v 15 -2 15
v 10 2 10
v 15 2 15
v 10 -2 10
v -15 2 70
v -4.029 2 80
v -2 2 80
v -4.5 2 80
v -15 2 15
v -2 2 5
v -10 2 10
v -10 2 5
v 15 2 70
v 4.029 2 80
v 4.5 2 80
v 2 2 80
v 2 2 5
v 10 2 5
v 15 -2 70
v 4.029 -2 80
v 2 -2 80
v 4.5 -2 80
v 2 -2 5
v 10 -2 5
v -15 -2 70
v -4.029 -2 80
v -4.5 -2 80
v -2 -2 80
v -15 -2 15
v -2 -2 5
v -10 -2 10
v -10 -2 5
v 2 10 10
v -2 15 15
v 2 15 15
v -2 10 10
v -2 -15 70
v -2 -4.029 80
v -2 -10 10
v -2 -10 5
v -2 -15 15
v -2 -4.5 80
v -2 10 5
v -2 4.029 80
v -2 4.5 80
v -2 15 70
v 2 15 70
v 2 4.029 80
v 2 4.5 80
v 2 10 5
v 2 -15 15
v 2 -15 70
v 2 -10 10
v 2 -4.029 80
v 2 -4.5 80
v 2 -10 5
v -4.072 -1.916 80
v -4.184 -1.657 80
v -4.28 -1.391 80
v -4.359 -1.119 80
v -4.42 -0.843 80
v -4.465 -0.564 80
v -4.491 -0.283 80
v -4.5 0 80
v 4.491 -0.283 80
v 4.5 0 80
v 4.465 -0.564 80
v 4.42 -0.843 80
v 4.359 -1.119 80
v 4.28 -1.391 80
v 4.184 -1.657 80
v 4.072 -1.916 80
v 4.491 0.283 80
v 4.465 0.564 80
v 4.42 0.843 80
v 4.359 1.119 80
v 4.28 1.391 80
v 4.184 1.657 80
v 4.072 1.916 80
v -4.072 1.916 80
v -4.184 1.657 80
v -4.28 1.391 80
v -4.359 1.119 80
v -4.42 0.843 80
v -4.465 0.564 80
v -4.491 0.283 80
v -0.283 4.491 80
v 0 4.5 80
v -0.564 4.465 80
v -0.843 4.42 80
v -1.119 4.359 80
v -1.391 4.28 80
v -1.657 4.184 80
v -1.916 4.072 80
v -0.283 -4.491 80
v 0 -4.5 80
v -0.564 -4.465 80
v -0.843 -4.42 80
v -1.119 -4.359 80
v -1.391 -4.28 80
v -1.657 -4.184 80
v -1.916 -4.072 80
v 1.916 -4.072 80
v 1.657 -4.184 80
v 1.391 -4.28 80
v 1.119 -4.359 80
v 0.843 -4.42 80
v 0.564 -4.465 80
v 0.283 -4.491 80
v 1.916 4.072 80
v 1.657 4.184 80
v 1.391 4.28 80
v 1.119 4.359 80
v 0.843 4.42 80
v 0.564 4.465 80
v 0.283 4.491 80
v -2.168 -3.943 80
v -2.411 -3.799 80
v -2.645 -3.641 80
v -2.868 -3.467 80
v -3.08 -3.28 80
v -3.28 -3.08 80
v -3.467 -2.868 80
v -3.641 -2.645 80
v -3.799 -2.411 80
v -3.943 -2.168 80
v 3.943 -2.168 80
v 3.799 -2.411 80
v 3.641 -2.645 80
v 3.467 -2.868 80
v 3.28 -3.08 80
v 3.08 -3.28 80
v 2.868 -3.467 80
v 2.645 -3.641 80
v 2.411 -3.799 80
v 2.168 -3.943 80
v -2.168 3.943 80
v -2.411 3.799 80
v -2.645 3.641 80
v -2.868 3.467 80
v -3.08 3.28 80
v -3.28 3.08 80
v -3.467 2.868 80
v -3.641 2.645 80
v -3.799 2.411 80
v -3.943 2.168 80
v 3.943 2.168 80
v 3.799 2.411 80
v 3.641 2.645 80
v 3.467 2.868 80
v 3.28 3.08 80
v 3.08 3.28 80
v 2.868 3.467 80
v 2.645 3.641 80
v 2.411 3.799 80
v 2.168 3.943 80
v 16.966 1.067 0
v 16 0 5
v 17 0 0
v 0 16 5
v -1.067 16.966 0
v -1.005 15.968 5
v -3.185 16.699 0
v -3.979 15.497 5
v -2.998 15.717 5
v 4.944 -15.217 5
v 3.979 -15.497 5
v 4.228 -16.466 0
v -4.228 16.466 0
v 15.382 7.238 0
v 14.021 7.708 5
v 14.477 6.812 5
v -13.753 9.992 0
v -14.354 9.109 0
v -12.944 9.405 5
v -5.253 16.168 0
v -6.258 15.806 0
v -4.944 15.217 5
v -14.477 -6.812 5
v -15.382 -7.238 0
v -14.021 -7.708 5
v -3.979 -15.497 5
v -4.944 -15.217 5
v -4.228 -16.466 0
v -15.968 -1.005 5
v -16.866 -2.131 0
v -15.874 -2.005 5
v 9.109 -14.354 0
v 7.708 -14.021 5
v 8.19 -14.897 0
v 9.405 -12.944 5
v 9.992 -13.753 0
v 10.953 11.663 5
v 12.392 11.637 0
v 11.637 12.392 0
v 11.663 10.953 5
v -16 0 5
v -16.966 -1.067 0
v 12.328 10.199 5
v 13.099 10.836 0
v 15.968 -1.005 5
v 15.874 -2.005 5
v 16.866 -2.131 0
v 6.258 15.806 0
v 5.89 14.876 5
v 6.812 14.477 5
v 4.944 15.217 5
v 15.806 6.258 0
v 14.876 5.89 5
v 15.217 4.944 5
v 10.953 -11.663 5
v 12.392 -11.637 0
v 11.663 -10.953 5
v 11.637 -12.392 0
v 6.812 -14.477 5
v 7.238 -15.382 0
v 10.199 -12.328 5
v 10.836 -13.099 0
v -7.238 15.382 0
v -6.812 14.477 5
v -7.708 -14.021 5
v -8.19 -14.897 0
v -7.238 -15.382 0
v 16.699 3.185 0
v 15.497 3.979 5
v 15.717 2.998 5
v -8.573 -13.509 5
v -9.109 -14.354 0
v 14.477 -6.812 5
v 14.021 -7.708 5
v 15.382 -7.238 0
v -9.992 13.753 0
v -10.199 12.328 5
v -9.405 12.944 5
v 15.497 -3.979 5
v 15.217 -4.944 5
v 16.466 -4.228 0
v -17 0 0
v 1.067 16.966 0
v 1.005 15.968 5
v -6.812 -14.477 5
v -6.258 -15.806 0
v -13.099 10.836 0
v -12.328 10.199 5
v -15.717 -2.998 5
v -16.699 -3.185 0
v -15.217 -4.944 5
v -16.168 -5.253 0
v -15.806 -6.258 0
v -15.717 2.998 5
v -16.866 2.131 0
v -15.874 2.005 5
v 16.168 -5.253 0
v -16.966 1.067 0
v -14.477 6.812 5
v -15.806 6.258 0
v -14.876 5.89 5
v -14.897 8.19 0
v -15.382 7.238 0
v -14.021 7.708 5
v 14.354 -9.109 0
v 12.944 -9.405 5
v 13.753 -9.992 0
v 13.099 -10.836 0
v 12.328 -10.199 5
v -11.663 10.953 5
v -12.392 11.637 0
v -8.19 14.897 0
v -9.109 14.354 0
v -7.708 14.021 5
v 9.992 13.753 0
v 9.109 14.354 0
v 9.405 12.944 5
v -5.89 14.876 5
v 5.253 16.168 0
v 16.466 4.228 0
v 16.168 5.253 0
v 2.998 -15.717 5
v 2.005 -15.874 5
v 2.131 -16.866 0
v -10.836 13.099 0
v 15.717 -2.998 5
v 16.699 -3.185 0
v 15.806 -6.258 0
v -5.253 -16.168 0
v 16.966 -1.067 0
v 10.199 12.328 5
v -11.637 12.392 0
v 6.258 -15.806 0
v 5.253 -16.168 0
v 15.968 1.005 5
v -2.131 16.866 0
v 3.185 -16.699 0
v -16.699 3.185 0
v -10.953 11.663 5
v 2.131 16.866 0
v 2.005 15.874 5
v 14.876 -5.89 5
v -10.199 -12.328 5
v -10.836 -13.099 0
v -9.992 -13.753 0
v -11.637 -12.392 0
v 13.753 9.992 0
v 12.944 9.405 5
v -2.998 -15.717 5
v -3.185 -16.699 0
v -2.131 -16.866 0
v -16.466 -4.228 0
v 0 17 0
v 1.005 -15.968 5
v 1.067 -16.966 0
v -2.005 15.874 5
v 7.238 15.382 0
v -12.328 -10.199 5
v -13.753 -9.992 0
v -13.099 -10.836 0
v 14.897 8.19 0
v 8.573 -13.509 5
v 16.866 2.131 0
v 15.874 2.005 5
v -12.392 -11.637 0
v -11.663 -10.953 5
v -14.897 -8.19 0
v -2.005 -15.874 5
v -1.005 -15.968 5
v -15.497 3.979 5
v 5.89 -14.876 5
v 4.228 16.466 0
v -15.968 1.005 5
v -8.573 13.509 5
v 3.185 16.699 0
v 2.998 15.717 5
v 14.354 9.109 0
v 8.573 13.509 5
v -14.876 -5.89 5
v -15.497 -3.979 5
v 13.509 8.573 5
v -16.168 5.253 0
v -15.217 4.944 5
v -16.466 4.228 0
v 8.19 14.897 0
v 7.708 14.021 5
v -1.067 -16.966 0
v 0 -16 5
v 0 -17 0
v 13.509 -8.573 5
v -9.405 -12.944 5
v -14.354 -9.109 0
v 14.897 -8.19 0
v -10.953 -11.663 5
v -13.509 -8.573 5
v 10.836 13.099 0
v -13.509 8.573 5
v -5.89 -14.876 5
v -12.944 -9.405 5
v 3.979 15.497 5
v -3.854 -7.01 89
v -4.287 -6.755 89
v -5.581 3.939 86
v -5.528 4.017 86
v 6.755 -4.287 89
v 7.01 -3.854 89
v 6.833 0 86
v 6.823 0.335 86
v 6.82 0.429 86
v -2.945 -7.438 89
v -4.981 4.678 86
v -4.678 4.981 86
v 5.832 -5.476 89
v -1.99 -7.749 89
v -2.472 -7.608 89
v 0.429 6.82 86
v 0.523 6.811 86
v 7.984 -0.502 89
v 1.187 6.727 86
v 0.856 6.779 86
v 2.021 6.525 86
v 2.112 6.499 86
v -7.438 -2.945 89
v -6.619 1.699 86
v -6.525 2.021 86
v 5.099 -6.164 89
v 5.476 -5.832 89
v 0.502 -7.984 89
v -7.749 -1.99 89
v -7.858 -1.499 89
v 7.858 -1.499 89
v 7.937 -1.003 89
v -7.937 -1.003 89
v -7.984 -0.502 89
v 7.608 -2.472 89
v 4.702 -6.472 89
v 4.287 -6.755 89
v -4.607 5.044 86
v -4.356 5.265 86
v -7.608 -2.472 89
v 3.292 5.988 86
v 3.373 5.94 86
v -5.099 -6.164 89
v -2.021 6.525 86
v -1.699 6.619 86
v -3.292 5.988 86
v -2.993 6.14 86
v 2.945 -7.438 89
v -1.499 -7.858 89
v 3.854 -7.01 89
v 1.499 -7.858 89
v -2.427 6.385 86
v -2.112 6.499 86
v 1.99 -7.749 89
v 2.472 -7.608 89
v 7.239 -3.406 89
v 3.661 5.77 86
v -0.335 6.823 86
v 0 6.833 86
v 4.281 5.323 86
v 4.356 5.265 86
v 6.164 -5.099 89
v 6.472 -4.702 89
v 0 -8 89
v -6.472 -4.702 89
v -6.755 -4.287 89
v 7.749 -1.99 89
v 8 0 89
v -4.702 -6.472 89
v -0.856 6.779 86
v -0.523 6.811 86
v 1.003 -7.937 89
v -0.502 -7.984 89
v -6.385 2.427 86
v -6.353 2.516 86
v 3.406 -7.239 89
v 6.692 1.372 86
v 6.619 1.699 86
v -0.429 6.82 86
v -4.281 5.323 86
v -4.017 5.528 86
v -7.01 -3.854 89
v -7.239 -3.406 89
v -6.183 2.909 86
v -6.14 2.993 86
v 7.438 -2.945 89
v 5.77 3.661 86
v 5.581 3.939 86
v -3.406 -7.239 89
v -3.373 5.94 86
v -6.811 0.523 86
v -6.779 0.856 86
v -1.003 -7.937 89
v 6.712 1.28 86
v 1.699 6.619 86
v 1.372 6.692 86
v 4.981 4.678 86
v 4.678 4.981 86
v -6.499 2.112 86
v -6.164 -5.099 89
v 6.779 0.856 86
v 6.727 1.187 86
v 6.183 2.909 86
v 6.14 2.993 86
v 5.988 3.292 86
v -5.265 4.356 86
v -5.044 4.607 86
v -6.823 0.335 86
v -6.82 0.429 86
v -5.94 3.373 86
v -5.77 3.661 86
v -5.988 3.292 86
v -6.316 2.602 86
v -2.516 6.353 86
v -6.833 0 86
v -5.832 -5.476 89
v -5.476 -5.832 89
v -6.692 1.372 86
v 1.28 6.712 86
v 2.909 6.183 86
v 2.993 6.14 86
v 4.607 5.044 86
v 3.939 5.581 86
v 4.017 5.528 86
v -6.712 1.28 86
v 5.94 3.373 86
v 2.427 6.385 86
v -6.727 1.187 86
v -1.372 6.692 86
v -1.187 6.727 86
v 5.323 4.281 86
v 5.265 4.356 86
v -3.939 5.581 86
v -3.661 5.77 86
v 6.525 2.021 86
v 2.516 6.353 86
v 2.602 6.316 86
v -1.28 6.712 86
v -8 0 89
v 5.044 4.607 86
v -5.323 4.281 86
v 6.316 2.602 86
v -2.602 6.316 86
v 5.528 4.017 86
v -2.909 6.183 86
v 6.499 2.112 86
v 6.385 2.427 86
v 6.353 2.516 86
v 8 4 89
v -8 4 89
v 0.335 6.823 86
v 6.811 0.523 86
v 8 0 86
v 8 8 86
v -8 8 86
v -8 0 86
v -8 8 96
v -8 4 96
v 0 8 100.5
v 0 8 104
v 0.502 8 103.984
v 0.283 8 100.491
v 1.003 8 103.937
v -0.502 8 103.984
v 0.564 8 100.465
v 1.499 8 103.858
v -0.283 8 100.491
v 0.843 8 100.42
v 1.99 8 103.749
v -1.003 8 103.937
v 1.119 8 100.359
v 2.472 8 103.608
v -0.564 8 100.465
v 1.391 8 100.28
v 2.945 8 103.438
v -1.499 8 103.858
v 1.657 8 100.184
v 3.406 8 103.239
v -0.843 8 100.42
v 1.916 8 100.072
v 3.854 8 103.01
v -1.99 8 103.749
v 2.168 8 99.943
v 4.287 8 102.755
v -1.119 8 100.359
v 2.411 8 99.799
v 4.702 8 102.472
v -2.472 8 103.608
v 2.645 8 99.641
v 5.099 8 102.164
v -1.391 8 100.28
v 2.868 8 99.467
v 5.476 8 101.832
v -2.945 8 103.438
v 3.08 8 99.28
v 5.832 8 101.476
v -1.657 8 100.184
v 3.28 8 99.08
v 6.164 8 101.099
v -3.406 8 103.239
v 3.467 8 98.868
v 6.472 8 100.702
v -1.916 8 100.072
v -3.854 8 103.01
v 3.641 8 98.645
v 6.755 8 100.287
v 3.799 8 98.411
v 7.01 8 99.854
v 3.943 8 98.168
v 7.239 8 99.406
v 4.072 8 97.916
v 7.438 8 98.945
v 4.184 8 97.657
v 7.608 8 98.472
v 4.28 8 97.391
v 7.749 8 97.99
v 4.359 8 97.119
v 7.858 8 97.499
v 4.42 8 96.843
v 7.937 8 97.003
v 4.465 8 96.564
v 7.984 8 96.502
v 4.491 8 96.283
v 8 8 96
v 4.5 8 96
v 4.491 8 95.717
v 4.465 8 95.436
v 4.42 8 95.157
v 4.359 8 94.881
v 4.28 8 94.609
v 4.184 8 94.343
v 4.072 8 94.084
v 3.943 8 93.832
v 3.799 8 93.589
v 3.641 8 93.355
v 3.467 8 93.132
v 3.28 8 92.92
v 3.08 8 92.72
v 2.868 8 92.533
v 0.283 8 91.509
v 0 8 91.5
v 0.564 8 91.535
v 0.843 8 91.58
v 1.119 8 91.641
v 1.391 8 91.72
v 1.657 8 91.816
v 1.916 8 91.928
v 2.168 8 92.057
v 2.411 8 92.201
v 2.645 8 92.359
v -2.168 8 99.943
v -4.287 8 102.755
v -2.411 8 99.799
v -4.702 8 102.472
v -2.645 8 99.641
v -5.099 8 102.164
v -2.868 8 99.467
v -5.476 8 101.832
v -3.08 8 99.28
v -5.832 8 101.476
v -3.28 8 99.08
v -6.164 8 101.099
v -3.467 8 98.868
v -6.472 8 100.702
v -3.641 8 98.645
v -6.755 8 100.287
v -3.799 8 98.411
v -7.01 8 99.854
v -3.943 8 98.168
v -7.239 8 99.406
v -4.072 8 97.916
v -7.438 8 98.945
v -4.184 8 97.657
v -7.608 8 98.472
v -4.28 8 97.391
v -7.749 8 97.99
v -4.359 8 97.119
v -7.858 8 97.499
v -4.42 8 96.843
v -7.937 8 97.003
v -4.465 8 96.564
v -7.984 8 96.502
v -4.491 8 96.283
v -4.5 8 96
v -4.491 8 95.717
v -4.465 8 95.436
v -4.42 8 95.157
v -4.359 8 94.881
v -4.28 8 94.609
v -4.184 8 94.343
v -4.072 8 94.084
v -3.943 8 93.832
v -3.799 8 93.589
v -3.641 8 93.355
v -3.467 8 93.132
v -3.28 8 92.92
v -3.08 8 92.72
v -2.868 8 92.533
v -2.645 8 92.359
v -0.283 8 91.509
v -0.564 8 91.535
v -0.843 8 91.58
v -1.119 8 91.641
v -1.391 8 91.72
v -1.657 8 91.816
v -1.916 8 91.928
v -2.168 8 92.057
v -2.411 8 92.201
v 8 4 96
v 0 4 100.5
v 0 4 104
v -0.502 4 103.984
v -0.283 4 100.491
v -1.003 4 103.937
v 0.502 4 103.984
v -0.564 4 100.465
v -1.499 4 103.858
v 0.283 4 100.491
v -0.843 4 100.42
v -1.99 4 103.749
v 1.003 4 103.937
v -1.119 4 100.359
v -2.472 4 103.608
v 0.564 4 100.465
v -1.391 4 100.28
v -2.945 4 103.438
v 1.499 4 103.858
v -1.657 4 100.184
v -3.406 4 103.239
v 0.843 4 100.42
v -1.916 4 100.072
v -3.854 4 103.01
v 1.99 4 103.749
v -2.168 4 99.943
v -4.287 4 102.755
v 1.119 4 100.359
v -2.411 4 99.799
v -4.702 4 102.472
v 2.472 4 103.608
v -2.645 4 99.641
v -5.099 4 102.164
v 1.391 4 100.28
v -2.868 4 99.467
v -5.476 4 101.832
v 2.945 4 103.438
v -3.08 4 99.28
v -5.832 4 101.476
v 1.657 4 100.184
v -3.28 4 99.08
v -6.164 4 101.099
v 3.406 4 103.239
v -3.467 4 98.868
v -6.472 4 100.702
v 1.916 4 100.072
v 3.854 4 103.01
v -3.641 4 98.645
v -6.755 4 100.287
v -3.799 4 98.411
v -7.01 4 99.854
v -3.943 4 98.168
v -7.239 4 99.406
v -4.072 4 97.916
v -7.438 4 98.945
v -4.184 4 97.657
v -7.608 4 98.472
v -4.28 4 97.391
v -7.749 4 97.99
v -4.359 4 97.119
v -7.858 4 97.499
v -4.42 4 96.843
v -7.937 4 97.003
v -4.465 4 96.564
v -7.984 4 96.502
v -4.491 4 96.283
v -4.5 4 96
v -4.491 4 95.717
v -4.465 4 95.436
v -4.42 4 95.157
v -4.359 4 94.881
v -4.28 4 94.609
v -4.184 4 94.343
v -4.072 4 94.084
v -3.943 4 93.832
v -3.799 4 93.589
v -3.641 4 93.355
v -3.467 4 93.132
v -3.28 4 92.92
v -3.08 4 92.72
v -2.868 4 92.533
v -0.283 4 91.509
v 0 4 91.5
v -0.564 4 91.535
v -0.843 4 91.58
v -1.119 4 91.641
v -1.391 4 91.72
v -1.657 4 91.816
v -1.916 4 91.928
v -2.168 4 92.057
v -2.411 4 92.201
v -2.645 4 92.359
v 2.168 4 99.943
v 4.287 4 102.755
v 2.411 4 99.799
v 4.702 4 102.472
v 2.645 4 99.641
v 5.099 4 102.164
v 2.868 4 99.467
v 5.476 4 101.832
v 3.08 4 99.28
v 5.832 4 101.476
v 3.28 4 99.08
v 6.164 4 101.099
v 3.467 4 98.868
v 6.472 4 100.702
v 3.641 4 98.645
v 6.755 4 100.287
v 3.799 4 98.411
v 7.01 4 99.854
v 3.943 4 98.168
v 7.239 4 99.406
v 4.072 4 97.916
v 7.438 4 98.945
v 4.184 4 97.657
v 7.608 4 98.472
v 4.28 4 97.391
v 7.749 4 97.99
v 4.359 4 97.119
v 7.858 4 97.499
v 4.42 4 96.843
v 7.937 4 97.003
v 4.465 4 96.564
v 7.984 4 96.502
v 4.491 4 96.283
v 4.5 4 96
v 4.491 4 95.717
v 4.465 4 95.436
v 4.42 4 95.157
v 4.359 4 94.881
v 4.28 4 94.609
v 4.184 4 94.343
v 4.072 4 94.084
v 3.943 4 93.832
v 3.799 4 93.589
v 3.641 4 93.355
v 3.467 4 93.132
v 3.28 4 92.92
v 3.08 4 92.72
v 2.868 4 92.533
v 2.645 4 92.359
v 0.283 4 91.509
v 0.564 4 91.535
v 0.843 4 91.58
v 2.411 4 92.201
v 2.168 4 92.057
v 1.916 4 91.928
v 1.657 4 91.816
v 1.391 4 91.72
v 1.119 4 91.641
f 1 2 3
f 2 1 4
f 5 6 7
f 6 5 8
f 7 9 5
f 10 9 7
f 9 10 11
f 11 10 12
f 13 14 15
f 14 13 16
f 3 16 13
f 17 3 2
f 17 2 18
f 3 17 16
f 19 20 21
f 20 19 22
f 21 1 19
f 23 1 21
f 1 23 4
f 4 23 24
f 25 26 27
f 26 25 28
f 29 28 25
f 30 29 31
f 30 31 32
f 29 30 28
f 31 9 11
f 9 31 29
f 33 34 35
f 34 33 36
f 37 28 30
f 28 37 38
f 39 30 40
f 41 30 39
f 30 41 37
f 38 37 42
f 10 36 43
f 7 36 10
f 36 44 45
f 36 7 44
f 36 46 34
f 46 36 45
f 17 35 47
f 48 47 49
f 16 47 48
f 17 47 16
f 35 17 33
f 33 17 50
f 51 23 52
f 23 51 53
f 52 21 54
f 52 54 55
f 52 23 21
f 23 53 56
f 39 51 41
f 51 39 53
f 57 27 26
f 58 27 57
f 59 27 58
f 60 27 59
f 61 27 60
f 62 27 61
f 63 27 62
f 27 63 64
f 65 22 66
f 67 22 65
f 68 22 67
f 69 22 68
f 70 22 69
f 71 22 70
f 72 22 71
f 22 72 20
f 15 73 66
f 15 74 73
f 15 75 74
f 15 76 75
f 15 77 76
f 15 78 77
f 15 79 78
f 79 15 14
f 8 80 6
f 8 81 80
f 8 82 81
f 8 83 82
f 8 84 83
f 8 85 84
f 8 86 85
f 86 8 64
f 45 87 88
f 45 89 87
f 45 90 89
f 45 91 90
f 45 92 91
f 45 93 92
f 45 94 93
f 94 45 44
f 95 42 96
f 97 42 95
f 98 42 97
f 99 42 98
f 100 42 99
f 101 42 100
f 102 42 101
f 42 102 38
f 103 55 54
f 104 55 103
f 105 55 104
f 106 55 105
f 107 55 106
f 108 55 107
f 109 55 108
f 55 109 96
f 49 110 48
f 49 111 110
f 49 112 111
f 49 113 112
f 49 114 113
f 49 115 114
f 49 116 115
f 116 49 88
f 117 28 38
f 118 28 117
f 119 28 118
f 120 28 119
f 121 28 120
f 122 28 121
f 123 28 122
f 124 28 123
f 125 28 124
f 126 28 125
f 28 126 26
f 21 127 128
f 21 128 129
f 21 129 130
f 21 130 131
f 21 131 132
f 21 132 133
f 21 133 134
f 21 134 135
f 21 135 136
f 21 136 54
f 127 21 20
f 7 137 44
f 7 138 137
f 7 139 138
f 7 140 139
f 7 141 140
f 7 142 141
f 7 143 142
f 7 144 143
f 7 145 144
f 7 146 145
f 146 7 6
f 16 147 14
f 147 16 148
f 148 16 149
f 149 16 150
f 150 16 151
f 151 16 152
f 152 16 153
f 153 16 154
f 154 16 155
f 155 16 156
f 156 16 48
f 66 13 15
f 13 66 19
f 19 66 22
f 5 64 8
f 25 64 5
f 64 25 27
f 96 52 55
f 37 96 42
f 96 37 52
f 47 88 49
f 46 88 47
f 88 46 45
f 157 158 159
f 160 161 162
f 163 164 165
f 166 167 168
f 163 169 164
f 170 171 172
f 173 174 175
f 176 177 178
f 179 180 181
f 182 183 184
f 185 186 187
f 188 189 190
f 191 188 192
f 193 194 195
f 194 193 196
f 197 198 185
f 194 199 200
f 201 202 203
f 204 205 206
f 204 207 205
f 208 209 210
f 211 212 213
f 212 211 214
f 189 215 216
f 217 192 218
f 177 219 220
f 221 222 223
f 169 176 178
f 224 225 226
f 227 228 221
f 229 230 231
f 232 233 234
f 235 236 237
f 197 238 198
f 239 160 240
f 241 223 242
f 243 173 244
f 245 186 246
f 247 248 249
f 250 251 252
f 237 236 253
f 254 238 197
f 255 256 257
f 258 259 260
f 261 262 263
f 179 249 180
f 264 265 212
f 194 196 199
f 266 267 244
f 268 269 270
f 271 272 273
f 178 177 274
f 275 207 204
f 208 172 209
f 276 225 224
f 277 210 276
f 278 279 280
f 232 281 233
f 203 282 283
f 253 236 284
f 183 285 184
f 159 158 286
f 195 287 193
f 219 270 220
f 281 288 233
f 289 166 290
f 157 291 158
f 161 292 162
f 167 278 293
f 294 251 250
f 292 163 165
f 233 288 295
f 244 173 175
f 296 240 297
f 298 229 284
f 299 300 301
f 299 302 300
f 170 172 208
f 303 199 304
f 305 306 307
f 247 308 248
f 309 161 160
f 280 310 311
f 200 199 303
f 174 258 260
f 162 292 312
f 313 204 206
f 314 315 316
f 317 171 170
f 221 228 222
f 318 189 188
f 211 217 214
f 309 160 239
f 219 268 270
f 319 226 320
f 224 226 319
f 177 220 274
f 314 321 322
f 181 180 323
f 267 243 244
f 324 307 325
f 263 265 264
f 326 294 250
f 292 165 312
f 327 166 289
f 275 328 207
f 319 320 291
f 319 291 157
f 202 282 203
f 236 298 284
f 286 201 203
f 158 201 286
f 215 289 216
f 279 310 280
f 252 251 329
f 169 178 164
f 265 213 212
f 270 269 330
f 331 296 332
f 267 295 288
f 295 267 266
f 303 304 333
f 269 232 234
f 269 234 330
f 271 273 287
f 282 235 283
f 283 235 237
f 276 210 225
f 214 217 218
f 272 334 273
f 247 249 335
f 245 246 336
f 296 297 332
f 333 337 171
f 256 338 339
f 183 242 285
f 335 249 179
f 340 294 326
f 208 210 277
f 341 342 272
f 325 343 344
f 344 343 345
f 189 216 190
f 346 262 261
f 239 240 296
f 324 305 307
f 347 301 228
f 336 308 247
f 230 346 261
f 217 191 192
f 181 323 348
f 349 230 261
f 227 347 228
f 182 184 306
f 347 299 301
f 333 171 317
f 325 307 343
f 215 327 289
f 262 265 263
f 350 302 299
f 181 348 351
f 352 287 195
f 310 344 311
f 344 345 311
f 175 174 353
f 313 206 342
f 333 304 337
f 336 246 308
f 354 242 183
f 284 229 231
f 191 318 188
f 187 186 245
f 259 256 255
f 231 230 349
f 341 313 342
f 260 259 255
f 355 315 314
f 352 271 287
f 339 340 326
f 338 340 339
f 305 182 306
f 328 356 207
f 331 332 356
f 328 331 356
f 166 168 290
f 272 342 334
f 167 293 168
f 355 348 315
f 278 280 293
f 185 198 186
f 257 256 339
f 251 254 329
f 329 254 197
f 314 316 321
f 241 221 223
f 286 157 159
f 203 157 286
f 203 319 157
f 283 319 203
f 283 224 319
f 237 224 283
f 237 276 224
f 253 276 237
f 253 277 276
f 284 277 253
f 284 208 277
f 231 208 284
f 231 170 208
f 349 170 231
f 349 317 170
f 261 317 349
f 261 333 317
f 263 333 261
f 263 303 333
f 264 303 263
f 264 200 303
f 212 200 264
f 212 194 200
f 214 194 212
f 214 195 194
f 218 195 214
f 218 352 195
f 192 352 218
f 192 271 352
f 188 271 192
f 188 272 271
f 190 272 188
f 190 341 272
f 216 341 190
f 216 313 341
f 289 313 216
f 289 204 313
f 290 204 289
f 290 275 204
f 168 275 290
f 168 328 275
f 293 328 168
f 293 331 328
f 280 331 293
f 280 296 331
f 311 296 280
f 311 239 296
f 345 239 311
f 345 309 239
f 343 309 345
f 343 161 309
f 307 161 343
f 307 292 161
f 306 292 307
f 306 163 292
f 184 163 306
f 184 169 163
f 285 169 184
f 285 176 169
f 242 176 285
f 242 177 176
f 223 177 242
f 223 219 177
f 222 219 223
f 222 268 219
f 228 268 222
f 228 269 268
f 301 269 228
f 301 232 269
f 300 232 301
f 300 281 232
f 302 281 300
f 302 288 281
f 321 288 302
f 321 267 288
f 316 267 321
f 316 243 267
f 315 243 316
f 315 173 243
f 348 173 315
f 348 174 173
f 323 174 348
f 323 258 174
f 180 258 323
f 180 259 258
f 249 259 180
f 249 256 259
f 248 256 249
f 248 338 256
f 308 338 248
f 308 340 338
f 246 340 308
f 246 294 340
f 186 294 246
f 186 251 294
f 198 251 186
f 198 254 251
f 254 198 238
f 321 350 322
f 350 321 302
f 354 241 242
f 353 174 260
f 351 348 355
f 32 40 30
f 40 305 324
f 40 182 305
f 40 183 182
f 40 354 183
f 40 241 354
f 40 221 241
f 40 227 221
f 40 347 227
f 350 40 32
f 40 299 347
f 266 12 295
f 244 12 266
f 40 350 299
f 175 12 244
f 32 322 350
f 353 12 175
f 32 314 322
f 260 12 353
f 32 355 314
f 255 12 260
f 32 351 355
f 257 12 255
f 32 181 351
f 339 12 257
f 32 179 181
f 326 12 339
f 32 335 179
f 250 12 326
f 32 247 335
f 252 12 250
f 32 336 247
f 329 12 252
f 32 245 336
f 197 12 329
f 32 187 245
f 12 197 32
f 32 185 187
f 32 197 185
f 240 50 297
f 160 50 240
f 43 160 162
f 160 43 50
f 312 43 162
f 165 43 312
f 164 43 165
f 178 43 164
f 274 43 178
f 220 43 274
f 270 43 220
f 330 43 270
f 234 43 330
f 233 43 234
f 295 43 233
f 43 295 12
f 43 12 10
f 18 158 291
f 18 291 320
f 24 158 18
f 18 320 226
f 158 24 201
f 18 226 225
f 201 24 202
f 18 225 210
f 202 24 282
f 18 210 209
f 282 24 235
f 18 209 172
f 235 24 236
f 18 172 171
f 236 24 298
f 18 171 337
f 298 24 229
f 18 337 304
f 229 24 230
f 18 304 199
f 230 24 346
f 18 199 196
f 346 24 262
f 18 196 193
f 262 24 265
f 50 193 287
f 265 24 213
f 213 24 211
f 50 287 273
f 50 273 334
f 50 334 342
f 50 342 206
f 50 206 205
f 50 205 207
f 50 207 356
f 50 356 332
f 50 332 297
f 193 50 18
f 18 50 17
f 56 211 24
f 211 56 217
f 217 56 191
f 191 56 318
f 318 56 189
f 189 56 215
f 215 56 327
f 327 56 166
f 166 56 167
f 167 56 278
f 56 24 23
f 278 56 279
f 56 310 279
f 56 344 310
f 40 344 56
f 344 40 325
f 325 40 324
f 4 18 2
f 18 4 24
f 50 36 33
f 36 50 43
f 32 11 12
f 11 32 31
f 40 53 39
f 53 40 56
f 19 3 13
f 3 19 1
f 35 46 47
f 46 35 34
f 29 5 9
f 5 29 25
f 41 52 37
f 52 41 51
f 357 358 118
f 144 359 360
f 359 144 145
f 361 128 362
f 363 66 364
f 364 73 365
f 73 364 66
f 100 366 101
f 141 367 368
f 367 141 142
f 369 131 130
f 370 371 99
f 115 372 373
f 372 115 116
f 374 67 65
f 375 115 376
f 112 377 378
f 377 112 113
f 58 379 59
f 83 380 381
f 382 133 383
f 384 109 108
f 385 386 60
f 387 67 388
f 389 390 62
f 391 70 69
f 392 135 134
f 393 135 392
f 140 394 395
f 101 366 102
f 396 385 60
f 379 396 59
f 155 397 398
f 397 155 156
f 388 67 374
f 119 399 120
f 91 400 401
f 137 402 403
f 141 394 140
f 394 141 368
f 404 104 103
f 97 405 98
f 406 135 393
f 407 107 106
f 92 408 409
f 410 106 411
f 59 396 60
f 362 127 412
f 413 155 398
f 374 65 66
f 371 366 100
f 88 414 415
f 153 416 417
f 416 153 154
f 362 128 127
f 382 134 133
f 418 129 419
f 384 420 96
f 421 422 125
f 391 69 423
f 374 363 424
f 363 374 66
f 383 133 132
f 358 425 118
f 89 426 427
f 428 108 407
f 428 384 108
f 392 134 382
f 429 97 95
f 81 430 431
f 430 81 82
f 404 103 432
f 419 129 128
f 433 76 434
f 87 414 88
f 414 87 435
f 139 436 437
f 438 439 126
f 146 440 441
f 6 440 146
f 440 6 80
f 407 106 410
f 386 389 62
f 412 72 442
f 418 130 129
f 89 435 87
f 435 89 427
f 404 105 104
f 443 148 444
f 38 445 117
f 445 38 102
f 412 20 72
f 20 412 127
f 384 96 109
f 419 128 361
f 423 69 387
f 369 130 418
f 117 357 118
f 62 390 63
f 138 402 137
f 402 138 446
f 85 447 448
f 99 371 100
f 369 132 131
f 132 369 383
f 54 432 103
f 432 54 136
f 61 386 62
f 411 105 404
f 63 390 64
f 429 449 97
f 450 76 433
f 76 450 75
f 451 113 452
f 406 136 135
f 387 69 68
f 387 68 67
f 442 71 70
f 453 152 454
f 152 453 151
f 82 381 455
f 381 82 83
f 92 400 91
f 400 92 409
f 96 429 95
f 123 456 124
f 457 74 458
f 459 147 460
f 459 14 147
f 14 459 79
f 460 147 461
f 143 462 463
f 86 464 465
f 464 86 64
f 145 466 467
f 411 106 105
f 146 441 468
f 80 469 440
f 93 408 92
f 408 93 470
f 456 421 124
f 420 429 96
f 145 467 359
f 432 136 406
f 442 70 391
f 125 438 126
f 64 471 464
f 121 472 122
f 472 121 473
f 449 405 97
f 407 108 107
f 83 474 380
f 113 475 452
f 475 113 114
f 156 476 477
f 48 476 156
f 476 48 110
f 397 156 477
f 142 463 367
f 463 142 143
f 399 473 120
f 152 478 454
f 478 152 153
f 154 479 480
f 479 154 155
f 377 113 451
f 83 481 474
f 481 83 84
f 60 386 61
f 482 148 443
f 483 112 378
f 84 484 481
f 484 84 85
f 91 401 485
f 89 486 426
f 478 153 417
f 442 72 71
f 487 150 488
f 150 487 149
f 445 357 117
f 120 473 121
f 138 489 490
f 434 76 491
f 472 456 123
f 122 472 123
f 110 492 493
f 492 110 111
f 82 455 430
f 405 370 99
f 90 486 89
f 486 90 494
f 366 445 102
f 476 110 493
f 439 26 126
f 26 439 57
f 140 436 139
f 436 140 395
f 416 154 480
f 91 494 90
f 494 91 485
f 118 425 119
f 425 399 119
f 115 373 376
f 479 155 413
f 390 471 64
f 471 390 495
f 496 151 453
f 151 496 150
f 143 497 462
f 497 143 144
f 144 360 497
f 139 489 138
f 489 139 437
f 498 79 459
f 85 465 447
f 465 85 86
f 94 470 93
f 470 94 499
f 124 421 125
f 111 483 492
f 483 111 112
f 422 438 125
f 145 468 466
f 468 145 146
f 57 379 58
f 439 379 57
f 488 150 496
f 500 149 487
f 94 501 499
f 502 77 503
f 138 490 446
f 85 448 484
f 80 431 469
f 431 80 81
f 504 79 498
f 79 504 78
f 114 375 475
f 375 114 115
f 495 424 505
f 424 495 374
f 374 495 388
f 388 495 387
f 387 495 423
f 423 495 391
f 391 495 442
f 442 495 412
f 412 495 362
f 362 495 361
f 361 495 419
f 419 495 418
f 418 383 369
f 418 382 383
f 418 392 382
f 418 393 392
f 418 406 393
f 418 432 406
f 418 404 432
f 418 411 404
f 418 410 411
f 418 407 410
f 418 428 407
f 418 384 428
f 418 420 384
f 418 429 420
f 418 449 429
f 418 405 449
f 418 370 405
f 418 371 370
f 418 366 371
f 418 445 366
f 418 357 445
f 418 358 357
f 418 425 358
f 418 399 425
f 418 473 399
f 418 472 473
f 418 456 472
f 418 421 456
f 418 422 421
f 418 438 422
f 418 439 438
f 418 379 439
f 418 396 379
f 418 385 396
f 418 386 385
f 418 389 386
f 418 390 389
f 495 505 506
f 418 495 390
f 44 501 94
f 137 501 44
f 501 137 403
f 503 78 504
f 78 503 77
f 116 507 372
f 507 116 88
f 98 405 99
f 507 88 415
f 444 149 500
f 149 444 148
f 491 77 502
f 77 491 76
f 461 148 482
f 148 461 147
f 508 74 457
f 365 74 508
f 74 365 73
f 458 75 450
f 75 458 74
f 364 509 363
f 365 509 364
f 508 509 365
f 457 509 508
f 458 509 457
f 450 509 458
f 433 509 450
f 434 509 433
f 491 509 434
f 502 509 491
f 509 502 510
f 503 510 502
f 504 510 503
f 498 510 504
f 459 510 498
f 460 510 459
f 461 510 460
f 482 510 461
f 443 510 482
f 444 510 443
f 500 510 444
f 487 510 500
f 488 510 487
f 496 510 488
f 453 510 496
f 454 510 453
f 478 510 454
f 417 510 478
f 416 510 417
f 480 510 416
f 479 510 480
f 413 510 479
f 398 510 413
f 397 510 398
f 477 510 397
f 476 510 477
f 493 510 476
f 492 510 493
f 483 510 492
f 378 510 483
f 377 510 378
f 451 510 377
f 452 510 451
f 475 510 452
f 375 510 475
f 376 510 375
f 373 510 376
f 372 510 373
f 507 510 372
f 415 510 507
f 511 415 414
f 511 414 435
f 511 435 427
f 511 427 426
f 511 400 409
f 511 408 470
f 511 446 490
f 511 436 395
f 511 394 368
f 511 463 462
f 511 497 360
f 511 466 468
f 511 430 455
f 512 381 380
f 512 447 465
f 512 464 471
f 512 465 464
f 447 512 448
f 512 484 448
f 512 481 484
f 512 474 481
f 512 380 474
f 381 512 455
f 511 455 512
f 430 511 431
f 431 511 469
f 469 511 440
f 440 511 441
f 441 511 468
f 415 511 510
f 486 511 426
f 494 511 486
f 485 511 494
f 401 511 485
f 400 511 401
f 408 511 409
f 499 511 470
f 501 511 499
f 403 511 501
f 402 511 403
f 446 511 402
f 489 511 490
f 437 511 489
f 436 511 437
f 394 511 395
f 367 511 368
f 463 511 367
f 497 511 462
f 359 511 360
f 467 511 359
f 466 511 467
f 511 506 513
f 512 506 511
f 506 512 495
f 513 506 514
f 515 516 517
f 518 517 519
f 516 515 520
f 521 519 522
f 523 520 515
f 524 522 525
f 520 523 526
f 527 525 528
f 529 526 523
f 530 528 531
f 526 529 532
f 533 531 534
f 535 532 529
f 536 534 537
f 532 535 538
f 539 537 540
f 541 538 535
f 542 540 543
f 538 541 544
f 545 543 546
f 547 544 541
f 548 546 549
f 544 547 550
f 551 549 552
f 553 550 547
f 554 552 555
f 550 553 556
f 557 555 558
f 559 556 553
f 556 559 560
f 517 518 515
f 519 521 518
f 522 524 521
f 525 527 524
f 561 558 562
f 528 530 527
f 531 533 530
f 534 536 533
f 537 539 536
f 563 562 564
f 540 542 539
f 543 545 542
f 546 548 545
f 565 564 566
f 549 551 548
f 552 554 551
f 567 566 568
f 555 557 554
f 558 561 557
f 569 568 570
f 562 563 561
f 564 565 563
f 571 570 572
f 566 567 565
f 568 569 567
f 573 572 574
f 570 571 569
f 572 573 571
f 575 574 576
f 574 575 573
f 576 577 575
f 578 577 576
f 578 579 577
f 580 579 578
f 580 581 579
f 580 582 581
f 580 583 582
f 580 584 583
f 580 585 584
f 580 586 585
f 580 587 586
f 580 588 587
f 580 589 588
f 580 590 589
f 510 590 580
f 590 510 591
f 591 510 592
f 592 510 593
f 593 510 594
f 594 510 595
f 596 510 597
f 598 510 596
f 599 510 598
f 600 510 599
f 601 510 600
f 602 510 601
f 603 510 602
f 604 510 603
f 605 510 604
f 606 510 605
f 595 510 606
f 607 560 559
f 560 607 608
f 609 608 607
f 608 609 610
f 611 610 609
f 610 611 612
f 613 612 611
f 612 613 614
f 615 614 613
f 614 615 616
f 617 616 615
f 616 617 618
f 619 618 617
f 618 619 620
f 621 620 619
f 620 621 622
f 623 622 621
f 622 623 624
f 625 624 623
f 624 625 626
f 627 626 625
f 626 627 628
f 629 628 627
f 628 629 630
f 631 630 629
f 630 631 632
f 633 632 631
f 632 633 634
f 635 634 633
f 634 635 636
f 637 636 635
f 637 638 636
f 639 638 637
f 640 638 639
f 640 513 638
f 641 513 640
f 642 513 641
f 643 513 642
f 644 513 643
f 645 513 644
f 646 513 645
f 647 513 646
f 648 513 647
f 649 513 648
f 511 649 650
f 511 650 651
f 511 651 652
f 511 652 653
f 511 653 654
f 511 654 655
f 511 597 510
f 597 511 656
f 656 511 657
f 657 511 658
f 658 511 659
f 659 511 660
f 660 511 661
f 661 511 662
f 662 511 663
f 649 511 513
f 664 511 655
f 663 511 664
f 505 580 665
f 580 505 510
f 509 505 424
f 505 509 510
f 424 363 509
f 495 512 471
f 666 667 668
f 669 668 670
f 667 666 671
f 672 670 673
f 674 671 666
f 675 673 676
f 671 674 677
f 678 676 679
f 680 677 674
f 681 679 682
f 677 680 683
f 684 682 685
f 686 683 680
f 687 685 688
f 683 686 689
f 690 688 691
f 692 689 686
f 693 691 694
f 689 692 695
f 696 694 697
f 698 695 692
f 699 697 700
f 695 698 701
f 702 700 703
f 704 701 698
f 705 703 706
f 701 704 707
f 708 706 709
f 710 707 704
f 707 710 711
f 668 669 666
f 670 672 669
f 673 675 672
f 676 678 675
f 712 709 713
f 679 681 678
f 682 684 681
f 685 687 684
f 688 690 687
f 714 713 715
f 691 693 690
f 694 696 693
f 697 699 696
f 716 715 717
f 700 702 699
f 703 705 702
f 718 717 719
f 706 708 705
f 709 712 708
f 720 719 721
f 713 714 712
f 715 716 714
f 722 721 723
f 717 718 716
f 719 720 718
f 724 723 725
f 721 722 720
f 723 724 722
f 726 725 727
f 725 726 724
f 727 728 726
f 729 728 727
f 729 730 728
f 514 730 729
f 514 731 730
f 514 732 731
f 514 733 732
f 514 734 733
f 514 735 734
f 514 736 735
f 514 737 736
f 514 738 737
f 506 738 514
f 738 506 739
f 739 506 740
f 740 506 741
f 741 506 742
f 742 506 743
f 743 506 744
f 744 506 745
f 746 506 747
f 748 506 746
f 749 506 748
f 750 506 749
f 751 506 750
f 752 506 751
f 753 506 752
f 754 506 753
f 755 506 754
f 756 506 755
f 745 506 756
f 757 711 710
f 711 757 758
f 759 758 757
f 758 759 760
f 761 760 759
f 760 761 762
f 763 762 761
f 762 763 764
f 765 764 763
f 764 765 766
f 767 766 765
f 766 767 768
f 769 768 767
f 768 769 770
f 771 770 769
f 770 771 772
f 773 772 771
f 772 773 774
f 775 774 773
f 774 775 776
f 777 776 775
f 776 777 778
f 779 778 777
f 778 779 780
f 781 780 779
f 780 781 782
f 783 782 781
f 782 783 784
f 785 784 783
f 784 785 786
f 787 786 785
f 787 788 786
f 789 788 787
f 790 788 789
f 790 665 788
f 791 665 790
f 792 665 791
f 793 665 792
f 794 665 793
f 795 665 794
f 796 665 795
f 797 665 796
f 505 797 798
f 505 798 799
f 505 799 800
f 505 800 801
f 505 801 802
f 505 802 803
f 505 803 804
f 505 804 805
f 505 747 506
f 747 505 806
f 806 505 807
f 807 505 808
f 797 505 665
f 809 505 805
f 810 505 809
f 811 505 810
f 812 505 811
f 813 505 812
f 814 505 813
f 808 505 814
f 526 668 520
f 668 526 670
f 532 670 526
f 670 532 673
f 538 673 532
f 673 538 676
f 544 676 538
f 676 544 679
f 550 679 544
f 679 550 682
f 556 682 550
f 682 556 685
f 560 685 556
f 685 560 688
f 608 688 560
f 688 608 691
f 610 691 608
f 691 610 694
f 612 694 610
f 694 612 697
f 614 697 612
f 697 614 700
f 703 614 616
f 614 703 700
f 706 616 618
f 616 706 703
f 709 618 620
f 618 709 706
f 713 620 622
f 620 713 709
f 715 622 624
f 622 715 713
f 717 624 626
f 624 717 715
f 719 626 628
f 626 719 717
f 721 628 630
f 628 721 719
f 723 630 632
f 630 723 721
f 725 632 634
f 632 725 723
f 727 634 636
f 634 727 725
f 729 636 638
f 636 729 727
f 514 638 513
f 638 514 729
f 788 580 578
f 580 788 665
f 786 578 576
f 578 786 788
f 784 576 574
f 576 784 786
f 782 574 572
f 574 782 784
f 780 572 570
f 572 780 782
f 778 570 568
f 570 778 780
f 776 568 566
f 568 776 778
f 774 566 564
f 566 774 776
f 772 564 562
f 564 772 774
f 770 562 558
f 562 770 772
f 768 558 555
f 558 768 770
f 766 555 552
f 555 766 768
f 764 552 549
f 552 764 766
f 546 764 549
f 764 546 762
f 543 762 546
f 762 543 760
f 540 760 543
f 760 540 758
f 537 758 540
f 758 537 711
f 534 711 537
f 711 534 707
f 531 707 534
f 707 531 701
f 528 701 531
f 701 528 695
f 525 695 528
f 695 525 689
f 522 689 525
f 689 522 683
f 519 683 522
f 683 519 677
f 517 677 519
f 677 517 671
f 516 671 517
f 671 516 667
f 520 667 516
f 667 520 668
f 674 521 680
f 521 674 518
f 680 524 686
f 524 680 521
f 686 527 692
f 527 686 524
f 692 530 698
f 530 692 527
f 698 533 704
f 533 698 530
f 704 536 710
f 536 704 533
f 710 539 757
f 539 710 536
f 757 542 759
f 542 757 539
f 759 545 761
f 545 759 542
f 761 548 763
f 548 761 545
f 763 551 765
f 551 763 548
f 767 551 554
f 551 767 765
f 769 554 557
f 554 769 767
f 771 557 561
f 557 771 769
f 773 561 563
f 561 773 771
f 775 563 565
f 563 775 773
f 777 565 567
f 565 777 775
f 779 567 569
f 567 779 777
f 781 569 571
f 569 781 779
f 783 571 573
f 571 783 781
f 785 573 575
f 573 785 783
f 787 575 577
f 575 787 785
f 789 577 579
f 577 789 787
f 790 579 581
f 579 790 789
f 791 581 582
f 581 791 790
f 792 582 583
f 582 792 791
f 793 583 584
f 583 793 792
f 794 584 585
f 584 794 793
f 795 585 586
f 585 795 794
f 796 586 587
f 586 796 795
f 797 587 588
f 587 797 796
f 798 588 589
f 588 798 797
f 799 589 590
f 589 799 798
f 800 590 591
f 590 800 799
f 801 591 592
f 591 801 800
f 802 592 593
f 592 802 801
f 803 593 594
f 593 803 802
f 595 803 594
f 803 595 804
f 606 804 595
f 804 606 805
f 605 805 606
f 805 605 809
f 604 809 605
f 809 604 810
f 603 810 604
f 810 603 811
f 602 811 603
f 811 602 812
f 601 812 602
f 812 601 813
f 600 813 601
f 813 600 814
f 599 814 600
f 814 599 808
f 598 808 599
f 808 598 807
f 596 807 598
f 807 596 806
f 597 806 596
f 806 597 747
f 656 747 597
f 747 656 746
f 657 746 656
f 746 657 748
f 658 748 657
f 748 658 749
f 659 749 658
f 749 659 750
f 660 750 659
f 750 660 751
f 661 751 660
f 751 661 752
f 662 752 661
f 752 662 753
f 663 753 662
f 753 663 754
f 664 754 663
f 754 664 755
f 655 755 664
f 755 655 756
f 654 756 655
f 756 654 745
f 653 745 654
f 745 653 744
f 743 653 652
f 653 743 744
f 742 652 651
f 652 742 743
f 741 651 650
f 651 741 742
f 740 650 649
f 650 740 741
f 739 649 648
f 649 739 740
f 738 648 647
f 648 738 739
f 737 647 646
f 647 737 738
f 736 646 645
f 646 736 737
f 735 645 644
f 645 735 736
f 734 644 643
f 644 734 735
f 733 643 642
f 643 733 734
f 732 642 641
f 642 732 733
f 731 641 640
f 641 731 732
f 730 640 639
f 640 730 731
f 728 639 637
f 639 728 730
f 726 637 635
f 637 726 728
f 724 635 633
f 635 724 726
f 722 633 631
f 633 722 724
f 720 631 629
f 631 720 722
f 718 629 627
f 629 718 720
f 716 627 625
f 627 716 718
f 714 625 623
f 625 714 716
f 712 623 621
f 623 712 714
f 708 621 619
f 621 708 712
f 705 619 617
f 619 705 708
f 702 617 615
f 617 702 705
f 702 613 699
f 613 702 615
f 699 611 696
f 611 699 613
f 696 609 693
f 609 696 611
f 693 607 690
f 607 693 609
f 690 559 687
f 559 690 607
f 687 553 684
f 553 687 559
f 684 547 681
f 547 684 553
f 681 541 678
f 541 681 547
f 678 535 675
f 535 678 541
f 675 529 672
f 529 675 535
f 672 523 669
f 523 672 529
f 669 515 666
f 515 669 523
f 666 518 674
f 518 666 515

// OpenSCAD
$fn=100;
cylinder(5, d1=34, d2=32);
translate([0, 0, 10])
union() {
    translate([-10, 2, 0])
        rotate([90, 0, 0]) 
        linear_extrude(4) 
        polygon([[0, 0], [20, 0], [25, 5], [-5, 5]]);
        
    translate([-2, -10, 0])
        rotate([90, 0, 90]) 
        linear_extrude(4) 
        polygon([[0, 0], [20, 0], [25, 5], [-5, 5]]);
}
translate([0, 0, 5]) linear_extrude(5) union() {
    translate([-10, -2, 0]) square([20,4]);
    translate([-2, -10, 0]) square([4,20]);
}

translate([0,0,15]) linear_extrude(55) union() {
    translate([-15, -2, 0]) square([30,4]);
    translate([-2, -15, 0]) square([4,30]);
}
translate([0,0,75])
translate([0,0,5])
rotate([180,0,0])
union() {
    translate([-4.5, 2, 0])
        rotate([90, 0, 0]) 
        linear_extrude(4) 
        polygon([[0, 0], [9, 0], [15+4.5, 10], [-15+4.5, 10]]);
        
    translate([-2, -4.5, 0])
        rotate([90, 0, 90]) 
        linear_extrude(4) 
        polygon([[0, 0], [9, 0], [15+4.5, 10], [-15+4.5, 10]]);
}
translate([0, 0, 80]) cylinder(9, d1=9, d2=16);
translate([-8, 0, 86]) linear_extrude(3) square([16, 8]);
translate([0, 8, 96]) rotate([90, 180, 0]) linear_extrude(4) difference() {
    union() {
        circle(8);
        translate([-8, 0, 0]) square([16, 8]);
    }
    circle(4.5);
}
//linear_extrude(4) square(16);
